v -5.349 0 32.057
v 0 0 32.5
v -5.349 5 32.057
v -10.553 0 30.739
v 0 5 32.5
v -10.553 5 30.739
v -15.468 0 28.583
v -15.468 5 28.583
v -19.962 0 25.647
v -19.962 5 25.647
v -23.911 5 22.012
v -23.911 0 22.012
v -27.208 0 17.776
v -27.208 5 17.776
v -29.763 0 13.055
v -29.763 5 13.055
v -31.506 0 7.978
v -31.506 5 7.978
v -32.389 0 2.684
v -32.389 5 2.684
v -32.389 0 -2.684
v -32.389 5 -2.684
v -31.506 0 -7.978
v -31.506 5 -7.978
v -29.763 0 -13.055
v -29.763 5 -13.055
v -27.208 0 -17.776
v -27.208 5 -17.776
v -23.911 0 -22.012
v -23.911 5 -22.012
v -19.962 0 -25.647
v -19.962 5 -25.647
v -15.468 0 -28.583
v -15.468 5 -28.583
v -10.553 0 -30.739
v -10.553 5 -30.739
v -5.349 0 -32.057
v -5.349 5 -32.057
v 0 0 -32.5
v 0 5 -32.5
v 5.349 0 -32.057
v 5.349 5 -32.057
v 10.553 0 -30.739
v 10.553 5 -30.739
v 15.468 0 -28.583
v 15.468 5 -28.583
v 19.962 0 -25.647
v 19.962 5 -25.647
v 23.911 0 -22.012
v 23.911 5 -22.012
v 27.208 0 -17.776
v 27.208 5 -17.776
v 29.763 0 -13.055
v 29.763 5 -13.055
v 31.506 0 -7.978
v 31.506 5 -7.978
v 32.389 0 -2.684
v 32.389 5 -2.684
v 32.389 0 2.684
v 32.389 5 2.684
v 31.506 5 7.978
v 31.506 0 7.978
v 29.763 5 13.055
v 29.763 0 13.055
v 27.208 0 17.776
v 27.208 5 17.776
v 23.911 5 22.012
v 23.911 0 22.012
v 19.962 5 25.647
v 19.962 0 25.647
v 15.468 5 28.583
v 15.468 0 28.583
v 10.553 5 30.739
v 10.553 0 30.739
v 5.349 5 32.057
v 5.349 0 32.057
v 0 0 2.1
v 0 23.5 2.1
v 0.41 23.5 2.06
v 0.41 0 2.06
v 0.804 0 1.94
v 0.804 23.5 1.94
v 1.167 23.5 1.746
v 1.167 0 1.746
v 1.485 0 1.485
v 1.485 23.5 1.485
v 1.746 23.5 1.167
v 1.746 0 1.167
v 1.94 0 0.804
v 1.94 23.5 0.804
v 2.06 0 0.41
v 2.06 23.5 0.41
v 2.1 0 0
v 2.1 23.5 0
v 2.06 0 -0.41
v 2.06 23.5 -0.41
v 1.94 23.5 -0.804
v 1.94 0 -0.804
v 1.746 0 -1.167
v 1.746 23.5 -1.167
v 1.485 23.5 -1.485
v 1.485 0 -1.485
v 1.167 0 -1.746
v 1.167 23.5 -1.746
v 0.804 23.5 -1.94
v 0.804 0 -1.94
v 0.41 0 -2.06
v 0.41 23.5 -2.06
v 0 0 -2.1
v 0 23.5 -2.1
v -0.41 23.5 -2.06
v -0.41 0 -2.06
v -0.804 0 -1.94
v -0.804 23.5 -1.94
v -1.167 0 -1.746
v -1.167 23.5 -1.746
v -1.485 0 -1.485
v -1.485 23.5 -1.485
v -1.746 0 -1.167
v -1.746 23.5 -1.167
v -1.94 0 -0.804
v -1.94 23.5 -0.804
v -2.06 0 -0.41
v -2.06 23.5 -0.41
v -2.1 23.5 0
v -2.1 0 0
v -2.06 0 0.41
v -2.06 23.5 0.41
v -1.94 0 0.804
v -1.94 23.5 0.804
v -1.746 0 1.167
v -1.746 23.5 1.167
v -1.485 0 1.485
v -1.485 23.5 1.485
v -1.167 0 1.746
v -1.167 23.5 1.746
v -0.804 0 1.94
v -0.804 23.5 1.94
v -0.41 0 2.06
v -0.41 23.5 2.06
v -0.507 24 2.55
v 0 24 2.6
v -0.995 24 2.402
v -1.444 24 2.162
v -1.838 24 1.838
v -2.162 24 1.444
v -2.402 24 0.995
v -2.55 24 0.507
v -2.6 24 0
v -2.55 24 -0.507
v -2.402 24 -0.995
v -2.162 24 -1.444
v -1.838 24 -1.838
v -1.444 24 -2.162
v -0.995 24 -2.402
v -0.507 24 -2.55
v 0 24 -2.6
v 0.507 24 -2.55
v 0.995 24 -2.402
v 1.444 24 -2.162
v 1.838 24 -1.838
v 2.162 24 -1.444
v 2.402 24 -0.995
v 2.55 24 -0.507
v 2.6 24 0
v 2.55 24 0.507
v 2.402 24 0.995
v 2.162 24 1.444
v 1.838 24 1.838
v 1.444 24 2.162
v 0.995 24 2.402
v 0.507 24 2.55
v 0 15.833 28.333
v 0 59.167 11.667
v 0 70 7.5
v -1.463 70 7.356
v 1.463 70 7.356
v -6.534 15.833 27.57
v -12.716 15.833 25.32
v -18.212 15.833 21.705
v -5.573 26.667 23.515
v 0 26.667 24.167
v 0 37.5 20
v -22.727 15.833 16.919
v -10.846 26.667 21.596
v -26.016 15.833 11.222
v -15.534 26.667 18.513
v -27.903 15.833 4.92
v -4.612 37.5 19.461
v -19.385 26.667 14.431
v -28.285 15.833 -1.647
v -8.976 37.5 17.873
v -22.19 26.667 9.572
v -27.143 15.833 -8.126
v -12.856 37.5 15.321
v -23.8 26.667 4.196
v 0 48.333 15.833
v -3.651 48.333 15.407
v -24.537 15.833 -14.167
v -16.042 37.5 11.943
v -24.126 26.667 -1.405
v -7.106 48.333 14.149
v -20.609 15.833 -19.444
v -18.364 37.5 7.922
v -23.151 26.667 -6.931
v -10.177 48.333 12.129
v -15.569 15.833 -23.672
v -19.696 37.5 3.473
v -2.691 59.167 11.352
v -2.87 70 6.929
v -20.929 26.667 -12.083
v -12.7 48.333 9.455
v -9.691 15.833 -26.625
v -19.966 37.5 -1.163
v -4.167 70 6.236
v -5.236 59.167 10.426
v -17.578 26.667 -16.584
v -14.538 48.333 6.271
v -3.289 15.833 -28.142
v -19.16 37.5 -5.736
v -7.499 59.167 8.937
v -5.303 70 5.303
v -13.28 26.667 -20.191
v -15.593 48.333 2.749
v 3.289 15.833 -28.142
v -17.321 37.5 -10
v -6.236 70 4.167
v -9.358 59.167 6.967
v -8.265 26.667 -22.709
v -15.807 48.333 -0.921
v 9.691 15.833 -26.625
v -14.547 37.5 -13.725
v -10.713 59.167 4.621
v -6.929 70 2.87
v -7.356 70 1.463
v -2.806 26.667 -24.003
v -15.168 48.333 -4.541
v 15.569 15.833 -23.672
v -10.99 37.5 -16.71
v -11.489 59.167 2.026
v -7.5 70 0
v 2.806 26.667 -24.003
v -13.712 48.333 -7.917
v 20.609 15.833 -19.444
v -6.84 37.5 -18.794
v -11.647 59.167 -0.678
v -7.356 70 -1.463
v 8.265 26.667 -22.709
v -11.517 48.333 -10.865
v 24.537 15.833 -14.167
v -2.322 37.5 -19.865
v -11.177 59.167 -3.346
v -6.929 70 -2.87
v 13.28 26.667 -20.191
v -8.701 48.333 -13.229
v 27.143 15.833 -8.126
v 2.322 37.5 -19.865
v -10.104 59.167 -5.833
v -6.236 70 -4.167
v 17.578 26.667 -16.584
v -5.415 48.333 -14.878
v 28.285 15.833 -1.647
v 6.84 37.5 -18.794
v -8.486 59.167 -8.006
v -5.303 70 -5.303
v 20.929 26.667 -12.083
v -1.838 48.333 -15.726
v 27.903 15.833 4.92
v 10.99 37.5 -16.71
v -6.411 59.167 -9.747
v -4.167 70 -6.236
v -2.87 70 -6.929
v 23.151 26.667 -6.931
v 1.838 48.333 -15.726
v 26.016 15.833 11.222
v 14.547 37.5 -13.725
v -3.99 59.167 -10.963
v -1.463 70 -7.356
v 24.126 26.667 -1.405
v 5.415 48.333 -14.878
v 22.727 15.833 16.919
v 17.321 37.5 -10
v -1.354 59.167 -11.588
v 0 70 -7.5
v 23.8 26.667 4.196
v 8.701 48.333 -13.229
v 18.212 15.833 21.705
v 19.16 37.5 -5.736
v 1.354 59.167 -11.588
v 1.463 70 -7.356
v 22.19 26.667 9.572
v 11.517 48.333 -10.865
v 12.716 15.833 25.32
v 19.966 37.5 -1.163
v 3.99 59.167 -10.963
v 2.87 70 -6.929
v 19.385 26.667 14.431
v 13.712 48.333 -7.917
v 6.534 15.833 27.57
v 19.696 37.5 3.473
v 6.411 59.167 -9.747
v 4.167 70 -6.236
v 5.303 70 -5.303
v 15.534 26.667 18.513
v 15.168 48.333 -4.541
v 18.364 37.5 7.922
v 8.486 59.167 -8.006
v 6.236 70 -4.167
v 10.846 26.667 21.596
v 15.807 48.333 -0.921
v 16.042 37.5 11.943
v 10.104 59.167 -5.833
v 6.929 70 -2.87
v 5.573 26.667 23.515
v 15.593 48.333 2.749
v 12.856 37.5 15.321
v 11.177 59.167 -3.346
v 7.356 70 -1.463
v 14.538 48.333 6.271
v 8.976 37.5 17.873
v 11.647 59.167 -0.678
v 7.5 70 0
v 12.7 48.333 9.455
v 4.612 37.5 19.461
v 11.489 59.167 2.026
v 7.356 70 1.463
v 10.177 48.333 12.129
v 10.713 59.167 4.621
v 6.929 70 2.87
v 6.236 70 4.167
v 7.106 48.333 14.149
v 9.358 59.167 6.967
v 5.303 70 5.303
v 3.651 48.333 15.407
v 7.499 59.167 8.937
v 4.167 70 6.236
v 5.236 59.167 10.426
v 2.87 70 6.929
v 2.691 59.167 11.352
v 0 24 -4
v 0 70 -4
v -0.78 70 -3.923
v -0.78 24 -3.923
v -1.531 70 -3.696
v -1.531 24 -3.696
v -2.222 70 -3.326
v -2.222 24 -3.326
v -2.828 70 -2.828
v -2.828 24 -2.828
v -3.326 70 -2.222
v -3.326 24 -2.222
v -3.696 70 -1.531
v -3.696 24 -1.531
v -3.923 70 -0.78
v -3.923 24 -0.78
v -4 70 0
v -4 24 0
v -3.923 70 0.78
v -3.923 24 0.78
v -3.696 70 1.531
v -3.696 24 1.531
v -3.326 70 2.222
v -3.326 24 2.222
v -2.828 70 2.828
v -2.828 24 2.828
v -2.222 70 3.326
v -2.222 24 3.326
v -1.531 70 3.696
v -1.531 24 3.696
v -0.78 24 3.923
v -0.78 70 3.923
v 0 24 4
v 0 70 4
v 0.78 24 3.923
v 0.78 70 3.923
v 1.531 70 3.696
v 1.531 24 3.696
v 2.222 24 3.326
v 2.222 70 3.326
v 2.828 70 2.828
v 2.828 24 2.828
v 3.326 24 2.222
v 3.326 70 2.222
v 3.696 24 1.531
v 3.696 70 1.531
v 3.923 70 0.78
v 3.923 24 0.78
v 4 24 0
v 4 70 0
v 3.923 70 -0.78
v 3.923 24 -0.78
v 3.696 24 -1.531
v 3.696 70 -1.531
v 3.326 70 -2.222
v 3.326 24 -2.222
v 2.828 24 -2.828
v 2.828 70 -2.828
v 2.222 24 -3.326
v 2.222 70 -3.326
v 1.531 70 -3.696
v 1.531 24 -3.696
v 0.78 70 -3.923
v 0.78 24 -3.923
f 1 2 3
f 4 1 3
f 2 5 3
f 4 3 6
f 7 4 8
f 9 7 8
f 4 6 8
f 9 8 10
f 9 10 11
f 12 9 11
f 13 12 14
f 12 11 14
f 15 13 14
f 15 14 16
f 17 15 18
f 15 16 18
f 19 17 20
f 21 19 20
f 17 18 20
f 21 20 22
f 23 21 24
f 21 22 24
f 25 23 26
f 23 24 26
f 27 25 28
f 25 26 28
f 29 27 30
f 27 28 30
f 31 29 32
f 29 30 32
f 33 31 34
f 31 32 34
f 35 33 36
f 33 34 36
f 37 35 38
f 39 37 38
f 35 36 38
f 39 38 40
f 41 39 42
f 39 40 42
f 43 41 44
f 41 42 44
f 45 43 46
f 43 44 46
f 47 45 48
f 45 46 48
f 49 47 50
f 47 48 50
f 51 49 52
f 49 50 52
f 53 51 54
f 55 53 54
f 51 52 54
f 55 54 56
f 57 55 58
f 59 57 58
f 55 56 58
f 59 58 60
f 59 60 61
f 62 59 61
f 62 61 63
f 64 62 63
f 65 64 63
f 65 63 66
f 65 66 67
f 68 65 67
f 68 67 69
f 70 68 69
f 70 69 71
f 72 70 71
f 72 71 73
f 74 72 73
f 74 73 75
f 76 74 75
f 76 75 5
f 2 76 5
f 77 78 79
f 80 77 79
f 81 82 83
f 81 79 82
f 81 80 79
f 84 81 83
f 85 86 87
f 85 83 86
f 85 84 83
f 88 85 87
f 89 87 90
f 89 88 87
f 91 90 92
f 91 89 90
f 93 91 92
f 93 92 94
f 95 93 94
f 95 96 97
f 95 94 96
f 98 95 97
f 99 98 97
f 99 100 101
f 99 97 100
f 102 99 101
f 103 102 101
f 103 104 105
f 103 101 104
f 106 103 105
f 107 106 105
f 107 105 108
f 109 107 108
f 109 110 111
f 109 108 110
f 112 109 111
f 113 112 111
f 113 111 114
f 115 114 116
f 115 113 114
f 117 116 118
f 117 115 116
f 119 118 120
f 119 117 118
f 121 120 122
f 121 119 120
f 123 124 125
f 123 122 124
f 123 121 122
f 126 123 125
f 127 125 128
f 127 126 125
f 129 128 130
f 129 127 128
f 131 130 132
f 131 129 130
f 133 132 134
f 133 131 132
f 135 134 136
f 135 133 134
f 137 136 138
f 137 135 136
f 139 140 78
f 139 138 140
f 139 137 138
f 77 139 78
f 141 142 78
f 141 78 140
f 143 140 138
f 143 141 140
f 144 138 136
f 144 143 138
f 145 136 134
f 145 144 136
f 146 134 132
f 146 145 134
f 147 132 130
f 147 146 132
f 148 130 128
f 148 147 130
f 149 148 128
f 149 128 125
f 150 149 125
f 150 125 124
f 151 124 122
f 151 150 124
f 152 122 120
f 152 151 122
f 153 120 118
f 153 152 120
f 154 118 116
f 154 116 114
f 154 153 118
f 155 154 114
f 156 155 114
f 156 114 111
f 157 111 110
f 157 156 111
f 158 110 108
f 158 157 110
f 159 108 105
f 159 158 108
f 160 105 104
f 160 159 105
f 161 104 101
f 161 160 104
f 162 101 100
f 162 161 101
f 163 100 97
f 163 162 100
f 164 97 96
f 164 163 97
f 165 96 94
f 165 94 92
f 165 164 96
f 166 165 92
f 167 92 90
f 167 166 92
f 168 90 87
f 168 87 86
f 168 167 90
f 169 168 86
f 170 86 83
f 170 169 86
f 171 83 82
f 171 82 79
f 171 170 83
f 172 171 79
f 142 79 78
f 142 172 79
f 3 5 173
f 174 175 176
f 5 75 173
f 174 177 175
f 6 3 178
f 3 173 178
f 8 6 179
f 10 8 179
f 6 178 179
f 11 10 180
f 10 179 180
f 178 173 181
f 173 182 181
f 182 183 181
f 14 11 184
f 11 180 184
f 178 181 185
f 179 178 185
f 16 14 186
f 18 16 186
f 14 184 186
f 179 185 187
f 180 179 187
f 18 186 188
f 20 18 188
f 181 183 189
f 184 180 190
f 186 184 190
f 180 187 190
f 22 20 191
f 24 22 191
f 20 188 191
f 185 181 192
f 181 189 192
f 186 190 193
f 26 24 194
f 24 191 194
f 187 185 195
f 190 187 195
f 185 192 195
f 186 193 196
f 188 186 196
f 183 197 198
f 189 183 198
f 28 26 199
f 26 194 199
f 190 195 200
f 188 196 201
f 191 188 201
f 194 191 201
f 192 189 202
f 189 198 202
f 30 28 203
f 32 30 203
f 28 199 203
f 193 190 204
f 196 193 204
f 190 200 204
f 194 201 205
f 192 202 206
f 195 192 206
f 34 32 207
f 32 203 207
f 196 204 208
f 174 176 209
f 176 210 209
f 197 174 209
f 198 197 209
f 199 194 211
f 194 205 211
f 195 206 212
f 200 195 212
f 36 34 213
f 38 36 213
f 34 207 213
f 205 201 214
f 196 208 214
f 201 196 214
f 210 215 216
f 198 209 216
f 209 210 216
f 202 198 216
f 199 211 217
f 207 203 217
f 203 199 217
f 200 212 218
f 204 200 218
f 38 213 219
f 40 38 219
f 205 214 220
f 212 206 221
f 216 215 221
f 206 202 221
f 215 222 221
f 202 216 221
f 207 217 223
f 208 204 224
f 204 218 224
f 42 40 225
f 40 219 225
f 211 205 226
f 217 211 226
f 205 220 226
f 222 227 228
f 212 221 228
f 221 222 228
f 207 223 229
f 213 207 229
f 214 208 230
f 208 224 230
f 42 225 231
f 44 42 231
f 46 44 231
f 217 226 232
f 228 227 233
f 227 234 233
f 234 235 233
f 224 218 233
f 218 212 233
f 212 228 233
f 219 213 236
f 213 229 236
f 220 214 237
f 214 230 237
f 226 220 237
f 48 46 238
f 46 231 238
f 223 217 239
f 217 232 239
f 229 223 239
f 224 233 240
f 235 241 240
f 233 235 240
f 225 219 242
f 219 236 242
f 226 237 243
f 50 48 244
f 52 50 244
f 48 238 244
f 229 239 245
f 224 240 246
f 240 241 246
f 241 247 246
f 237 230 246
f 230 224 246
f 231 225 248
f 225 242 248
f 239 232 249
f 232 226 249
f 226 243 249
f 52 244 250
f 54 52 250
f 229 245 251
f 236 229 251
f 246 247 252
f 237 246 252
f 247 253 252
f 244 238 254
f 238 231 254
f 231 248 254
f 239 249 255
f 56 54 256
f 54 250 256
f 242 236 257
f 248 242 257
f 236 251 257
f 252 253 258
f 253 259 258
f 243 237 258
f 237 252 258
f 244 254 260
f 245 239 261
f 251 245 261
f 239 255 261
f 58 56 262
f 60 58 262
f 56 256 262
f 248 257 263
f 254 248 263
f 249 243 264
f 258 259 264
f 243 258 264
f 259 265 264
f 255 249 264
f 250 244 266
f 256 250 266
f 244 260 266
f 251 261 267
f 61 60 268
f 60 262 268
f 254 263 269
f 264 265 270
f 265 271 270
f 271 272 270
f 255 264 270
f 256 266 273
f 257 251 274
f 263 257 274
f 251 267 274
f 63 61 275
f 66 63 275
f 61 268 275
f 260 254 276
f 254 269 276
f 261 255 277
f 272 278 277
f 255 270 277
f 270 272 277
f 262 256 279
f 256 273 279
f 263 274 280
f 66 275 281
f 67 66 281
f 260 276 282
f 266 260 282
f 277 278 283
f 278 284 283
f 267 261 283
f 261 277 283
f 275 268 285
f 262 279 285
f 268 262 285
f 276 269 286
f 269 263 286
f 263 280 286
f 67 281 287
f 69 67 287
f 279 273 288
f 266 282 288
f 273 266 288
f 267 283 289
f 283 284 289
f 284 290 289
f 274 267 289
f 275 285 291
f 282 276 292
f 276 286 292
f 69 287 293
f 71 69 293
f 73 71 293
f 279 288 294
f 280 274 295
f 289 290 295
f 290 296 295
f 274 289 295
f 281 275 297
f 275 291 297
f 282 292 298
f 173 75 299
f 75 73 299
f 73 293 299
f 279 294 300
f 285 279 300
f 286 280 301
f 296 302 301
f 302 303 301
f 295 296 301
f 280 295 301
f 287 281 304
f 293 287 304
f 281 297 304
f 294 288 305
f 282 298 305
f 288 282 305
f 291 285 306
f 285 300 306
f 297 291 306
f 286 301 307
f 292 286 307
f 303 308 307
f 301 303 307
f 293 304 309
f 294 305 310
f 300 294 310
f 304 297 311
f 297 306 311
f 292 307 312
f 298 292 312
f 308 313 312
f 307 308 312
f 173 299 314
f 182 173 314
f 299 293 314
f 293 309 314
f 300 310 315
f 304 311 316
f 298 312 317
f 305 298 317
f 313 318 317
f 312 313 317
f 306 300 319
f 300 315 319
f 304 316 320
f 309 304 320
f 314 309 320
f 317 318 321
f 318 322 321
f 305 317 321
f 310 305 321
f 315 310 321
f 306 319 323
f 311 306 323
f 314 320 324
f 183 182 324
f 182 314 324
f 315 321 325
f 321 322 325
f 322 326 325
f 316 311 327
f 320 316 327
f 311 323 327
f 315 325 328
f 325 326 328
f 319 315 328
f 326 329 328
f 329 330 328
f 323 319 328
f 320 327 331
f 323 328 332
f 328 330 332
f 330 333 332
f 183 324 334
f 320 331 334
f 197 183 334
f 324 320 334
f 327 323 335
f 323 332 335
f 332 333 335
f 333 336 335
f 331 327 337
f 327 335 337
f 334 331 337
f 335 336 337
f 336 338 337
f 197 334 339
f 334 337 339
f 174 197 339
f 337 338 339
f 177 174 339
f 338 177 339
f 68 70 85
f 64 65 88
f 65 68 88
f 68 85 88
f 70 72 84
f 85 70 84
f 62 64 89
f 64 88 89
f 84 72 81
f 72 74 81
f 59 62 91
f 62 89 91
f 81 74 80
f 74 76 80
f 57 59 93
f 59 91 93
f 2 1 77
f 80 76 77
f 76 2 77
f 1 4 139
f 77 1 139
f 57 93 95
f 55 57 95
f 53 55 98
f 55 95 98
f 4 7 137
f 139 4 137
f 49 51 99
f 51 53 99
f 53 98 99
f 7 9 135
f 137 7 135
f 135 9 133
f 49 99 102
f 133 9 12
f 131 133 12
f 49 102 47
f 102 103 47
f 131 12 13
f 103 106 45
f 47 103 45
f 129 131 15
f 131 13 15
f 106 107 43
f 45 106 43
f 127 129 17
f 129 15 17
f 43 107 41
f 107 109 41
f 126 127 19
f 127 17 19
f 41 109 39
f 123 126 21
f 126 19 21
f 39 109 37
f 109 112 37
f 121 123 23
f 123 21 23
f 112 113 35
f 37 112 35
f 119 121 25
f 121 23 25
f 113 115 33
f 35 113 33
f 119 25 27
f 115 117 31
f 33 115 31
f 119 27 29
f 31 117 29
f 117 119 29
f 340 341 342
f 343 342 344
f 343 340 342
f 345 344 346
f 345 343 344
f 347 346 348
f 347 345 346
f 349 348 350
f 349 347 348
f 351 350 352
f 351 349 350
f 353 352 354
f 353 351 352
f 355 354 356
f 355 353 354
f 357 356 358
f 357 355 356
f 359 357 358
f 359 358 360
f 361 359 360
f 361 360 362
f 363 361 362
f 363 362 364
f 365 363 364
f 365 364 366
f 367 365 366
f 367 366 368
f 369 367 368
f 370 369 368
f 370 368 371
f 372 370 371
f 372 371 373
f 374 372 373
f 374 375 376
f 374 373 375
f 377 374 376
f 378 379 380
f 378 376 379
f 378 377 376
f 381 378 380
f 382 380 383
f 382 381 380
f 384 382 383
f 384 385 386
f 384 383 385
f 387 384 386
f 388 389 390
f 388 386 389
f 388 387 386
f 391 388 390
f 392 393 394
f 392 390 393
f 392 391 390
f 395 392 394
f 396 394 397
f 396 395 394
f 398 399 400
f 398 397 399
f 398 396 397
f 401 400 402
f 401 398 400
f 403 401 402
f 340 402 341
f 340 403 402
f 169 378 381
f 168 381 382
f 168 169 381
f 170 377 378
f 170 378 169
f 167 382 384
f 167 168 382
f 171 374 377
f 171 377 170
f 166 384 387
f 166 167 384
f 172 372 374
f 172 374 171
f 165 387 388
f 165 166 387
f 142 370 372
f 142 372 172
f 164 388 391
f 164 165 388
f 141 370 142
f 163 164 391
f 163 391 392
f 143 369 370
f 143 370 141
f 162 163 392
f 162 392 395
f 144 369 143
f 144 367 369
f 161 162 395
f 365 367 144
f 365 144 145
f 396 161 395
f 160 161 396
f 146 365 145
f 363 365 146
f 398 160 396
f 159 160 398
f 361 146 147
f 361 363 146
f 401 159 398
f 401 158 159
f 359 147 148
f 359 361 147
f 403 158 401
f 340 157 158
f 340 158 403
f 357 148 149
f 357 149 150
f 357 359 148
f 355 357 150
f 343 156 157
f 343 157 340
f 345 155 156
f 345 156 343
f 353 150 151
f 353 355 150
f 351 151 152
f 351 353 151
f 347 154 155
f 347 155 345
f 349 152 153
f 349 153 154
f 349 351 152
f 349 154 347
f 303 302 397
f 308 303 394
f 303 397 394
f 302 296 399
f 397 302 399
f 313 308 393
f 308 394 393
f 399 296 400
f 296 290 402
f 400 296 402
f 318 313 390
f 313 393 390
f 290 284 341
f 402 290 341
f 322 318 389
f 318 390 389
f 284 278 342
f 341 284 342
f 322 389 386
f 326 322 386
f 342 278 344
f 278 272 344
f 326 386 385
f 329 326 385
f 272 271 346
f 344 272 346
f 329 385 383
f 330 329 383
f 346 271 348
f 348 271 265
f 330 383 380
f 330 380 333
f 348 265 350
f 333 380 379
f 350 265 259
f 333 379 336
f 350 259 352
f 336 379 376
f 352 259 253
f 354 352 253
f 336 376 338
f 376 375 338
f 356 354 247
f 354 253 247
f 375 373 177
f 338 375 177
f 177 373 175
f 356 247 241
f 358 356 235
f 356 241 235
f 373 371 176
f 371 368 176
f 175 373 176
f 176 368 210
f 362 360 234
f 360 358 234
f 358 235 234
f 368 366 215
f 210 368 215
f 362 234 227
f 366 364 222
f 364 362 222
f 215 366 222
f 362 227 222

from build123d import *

# Parameters (mm, degrees)
ODEBRAT_VYSUNUT_M2_DEPTH      = 84.740671122
ODEBRAT_VYSUNUT_M2_DEPTH_BACK = 84.740671122
SKICA4_R                      = 2.1
ODEBRAT_VYSUNUT_M3_DEPTH      = 84.740671122
ODEBRAT_VYSUNUT_M3_DEPTH_BACK = 46
SKICA6_R                      = 4
ZKOSEN_1_SIZE                 = 0.5


with BuildPart() as part:
    # Skica1 → Rotovat1 (revolve)
    with BuildSketch(Plane.XY, mode=Mode.PRIVATE) as rotovat1_sk:
        Polygon((0, 0), (32.5, 0), (32.5, 5), (7.5, 70), (0, 70), align=None)
    revolve(rotovat1_sk.sketch.rotate(Axis((0, 0, 0), (0, -1, 0)), 90), axis=Axis((0, 0, 0), (0, -1, 0)))

    # Skica4 → Odebrat vysunutím2 (cut, two sides: drawn at the far end of the back side and taken through both)
    with BuildSketch(Plane(origin=(0, 70, 0), x_dir=(1, 0, 0), z_dir=(0, 1, 0)).offset(-ODEBRAT_VYSUNUT_M2_DEPTH_BACK)):
        with Locations(Location((0, 0, 0), (0, 0, 270))):
            Circle(SKICA4_R)
    extrude(amount=ODEBRAT_VYSUNUT_M2_DEPTH + ODEBRAT_VYSUNUT_M2_DEPTH_BACK, mode=Mode.SUBTRACT)

    # Skica6 → Odebrat vysunutím3 (cut, two sides: drawn at the far end of the back side and taken through both)
    with BuildSketch(Plane(origin=(0, 70, 0), x_dir=(1, 0, 0), z_dir=(0, 1, 0)).offset(-ODEBRAT_VYSUNUT_M3_DEPTH_BACK)):
        with Locations(Location((0, 0, 0), (0, 0, 90))):
            Circle(SKICA6_R)
    extrude(amount=ODEBRAT_VYSUNUT_M3_DEPTH + ODEBRAT_VYSUNUT_M3_DEPTH_BACK, mode=Mode.SUBTRACT)

    # Zkosení1
    zkosen_1_edges = [part.edges().sort_by_distance(p)[0] for p in [
        (0, 24, -2.1),
    ]]
    chamfer(zkosen_1_edges, length=ZKOSEN_1_SIZE)


solid = part.part
